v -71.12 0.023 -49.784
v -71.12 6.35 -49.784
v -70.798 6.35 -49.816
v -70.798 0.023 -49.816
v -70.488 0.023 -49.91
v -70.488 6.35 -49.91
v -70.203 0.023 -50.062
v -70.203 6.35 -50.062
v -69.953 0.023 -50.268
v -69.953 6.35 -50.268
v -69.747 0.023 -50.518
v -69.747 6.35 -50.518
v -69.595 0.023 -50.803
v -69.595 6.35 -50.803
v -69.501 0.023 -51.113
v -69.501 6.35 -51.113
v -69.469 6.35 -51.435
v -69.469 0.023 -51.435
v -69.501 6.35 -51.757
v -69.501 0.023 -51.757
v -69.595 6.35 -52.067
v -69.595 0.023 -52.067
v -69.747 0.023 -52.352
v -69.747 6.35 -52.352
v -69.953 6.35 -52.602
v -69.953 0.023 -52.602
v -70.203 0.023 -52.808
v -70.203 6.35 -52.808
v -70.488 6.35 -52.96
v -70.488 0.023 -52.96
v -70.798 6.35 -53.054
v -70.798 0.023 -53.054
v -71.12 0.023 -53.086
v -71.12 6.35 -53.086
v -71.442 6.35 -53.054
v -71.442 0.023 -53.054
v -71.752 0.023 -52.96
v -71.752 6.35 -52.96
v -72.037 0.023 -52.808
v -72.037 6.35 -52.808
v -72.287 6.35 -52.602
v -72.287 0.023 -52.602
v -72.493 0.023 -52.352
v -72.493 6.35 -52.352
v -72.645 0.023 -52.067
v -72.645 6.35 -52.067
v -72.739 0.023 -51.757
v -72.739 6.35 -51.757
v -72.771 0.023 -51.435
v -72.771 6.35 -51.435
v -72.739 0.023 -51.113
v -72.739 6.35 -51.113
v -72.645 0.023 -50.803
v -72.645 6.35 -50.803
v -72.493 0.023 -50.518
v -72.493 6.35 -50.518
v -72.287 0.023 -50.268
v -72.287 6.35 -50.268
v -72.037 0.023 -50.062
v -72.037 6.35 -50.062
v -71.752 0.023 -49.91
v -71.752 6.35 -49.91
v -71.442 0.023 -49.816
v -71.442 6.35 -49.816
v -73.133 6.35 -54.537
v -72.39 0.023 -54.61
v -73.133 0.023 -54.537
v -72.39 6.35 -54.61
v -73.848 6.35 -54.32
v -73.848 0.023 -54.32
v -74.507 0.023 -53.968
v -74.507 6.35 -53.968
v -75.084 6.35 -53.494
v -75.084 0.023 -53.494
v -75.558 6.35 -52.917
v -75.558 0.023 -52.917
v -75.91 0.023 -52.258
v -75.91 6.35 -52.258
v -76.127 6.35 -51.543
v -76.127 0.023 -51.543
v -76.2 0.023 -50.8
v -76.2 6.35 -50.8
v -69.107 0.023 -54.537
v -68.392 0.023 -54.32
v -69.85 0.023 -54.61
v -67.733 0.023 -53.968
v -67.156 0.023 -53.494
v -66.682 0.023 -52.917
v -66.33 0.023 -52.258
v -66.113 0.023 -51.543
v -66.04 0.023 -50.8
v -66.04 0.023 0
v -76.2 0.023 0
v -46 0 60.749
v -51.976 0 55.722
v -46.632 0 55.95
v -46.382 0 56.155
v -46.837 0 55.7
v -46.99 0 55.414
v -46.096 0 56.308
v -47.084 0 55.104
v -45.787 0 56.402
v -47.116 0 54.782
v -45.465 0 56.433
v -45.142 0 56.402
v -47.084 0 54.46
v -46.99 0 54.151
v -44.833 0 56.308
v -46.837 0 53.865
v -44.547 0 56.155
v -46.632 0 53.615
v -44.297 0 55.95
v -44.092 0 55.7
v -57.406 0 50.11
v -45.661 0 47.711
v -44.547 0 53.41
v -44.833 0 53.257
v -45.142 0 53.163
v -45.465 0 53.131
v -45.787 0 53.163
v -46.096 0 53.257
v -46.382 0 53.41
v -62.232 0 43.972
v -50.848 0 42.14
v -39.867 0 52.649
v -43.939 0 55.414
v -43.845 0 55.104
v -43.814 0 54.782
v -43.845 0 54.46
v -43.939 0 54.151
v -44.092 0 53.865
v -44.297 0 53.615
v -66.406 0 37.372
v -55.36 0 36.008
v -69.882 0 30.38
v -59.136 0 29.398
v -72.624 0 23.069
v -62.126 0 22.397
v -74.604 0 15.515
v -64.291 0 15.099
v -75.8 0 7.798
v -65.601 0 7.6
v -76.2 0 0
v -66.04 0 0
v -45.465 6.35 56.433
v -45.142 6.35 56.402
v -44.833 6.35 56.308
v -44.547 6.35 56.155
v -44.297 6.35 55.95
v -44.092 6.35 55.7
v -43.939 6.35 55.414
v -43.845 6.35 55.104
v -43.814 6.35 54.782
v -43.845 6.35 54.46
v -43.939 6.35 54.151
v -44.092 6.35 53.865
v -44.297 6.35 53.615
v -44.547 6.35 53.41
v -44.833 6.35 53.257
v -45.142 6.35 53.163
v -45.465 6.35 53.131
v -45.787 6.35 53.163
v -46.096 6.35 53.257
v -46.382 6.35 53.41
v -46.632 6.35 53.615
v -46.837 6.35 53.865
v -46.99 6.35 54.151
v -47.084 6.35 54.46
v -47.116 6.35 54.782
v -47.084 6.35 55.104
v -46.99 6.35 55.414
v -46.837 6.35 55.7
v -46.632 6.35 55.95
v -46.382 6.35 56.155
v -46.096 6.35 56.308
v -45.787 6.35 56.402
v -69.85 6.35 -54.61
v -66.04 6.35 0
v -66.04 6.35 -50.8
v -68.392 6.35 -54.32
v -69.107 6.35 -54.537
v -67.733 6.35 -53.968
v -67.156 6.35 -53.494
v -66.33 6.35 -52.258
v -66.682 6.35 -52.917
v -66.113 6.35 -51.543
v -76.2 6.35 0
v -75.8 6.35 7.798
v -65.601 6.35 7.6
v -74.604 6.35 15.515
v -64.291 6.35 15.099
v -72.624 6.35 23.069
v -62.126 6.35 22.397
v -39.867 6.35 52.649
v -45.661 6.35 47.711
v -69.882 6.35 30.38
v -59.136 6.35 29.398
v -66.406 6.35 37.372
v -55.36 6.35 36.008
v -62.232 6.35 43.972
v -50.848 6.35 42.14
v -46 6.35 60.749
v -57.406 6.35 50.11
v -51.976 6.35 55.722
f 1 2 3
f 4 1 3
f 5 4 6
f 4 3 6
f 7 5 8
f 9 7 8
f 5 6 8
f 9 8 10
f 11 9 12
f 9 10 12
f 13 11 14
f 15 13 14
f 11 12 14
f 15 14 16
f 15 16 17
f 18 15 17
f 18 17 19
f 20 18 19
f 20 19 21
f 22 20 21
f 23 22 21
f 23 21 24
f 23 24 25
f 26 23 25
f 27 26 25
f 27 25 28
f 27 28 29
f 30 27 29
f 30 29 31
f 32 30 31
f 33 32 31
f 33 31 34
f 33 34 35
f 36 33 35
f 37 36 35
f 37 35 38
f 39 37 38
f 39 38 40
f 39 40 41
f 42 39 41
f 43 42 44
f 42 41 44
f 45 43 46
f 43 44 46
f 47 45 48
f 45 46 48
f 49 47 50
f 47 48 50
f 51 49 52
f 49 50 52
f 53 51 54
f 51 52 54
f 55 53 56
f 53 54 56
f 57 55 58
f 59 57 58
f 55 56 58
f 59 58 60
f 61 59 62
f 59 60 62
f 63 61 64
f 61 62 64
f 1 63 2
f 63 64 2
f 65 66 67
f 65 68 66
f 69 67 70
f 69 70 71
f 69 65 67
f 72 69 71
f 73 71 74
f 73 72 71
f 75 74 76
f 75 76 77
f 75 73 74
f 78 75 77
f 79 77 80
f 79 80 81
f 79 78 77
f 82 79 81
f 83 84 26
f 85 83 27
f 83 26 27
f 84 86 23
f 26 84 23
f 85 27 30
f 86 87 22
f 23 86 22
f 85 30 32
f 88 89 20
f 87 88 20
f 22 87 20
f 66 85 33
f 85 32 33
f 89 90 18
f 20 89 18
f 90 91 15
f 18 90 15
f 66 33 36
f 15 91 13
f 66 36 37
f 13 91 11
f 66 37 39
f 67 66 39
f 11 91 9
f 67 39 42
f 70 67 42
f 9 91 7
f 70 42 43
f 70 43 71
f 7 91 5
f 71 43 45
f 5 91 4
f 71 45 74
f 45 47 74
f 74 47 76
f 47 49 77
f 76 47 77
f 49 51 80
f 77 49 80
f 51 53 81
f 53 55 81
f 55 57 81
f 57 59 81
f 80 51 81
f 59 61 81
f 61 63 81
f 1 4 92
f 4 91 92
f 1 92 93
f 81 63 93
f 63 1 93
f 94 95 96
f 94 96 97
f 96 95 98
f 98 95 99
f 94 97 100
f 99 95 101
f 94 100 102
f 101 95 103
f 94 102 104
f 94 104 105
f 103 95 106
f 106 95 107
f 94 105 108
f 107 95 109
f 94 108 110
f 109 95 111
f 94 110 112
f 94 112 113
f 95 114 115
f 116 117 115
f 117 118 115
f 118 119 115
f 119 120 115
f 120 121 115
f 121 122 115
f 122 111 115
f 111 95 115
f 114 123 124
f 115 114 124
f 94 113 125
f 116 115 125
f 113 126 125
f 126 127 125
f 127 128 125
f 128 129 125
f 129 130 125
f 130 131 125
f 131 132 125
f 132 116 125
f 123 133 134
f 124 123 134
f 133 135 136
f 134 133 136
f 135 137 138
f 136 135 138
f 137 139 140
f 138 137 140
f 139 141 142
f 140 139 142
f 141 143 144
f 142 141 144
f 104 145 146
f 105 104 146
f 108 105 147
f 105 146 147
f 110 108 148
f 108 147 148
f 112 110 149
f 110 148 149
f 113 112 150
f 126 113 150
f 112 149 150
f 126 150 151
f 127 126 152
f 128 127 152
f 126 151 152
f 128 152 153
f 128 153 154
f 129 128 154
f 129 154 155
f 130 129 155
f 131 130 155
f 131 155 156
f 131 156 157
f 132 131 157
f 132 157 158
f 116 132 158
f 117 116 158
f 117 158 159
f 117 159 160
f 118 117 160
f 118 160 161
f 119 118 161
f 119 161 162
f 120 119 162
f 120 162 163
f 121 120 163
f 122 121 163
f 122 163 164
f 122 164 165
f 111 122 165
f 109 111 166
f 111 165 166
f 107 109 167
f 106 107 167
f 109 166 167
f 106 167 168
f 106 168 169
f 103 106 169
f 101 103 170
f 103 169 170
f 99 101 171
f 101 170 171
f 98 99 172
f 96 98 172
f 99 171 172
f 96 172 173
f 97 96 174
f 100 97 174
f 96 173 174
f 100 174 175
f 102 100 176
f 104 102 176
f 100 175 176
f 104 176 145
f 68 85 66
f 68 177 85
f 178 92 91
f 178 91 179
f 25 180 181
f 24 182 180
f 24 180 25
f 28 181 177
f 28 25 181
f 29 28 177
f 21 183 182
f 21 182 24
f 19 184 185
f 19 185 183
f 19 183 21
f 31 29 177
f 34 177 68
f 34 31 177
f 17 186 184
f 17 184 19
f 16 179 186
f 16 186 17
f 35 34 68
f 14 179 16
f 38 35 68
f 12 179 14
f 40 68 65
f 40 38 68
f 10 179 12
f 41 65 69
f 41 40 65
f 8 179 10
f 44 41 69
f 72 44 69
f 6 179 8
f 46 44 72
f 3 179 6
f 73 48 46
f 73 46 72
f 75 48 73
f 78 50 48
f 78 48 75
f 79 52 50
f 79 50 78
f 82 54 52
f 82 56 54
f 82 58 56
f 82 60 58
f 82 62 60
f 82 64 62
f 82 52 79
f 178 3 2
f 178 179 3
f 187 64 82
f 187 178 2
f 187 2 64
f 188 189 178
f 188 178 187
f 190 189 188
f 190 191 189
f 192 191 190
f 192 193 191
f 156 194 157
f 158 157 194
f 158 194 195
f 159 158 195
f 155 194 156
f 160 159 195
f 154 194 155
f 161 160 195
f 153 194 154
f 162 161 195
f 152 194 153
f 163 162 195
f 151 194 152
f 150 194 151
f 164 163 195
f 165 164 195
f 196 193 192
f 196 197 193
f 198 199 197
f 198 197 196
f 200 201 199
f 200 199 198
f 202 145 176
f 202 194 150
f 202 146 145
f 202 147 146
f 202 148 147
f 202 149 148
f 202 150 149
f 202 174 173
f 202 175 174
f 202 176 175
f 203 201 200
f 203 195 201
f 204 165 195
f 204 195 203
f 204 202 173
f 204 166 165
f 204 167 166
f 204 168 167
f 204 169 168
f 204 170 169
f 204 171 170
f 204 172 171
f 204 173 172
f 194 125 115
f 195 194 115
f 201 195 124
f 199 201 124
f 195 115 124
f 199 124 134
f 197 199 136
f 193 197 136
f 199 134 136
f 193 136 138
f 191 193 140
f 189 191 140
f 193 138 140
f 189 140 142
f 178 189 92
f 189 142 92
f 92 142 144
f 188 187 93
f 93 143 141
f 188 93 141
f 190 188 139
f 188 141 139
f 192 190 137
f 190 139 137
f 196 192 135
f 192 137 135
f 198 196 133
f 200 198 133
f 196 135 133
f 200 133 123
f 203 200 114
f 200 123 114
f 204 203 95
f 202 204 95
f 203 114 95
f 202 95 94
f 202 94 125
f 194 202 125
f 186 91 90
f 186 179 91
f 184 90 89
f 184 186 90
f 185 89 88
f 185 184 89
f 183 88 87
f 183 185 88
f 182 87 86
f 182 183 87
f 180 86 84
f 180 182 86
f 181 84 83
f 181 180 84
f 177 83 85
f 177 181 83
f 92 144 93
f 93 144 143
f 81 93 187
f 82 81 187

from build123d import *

# Parameters (mm, degrees)
BOSS_EXTRUDE1_DEPTH = 6.35
SKETCH2_W           = 10.16
SKETCH2_H           = 6.326695662
BOSS_EXTRUDE2_DEPTH = 54.61
SKETCH3_R           = 1.651
CUT_EXTRUDE1_DEPTH  = 6.35
SKETCH4_R           = 1.651
CUT_EXTRUDE2_DEPTH  = 22.606
FILLET1_R           = 3.81


with BuildPart() as part:
    # Sketch1 → Boss-Extrude1 (new body)
    with BuildSketch(Plane(origin=(0, 0, 0), x_dir=(1, 0, 0), z_dir=(0, 1, 0))):
        with BuildLine():
            Line((-66.04, 0), (-76.2, 0))
            ThreePointArc((-76.2, 0), (-68.233584612, -33.920759587), (-46.000054305, -60.748950641))
            Line((-46.000054305, -60.748950641), (-39.866713731, -52.649090555))
            ThreePointArc((-39.866713731, -52.649090555), (-59.135773331, -29.397991642), (-66.04, 0))
        make_face()
    extrude(amount=BOSS_EXTRUDE1_DEPTH)

    # Sketch2 → Boss-Extrude2 (add)
    with BuildSketch(Plane(origin=(0, 0, 0), x_dir=(-1, 0, 0), z_dir=(0, 0, -1))):
        with Locations((71.12, 3.186652169)):
            Rectangle(SKETCH2_W, SKETCH2_H)
    extrude(amount=BOSS_EXTRUDE2_DEPTH)

    # Sketch3 → Cut-Extrude1 (cut)
    with BuildSketch(Plane(origin=(0, 6.35, 0), x_dir=(1, 0, 0), z_dir=(0, 1, 0))):
        with Locations(Location((-71.12, 51.435, 0), (0, 0, 270))):
            Circle(SKETCH3_R)
    extrude(amount=-CUT_EXTRUDE1_DEPTH, mode=Mode.SUBTRACT)

    # Sketch4 → Cut-Extrude2 (cut)
    with BuildSketch(Plane(origin=(0, 6.35, 0), x_dir=(1, 0, 0), z_dir=(0, 1, 0))):
        with Locations(Location((-45.464590295, -54.782351668, 0), (0, 0, 270))):
            Circle(SKETCH4_R)
    extrude(amount=-CUT_EXTRUDE2_DEPTH, mode=Mode.SUBTRACT)

    # Fillet1
    fillet1_edges = [part.edges().sort_by_distance(p)[0] for p in [
        (-66.04, 3.186652169, -54.61),
        (-76.2, 3.186652169, -54.61),
    ]]
    fillet(fillet1_edges, radius=FILLET1_R)


solid = part.part
